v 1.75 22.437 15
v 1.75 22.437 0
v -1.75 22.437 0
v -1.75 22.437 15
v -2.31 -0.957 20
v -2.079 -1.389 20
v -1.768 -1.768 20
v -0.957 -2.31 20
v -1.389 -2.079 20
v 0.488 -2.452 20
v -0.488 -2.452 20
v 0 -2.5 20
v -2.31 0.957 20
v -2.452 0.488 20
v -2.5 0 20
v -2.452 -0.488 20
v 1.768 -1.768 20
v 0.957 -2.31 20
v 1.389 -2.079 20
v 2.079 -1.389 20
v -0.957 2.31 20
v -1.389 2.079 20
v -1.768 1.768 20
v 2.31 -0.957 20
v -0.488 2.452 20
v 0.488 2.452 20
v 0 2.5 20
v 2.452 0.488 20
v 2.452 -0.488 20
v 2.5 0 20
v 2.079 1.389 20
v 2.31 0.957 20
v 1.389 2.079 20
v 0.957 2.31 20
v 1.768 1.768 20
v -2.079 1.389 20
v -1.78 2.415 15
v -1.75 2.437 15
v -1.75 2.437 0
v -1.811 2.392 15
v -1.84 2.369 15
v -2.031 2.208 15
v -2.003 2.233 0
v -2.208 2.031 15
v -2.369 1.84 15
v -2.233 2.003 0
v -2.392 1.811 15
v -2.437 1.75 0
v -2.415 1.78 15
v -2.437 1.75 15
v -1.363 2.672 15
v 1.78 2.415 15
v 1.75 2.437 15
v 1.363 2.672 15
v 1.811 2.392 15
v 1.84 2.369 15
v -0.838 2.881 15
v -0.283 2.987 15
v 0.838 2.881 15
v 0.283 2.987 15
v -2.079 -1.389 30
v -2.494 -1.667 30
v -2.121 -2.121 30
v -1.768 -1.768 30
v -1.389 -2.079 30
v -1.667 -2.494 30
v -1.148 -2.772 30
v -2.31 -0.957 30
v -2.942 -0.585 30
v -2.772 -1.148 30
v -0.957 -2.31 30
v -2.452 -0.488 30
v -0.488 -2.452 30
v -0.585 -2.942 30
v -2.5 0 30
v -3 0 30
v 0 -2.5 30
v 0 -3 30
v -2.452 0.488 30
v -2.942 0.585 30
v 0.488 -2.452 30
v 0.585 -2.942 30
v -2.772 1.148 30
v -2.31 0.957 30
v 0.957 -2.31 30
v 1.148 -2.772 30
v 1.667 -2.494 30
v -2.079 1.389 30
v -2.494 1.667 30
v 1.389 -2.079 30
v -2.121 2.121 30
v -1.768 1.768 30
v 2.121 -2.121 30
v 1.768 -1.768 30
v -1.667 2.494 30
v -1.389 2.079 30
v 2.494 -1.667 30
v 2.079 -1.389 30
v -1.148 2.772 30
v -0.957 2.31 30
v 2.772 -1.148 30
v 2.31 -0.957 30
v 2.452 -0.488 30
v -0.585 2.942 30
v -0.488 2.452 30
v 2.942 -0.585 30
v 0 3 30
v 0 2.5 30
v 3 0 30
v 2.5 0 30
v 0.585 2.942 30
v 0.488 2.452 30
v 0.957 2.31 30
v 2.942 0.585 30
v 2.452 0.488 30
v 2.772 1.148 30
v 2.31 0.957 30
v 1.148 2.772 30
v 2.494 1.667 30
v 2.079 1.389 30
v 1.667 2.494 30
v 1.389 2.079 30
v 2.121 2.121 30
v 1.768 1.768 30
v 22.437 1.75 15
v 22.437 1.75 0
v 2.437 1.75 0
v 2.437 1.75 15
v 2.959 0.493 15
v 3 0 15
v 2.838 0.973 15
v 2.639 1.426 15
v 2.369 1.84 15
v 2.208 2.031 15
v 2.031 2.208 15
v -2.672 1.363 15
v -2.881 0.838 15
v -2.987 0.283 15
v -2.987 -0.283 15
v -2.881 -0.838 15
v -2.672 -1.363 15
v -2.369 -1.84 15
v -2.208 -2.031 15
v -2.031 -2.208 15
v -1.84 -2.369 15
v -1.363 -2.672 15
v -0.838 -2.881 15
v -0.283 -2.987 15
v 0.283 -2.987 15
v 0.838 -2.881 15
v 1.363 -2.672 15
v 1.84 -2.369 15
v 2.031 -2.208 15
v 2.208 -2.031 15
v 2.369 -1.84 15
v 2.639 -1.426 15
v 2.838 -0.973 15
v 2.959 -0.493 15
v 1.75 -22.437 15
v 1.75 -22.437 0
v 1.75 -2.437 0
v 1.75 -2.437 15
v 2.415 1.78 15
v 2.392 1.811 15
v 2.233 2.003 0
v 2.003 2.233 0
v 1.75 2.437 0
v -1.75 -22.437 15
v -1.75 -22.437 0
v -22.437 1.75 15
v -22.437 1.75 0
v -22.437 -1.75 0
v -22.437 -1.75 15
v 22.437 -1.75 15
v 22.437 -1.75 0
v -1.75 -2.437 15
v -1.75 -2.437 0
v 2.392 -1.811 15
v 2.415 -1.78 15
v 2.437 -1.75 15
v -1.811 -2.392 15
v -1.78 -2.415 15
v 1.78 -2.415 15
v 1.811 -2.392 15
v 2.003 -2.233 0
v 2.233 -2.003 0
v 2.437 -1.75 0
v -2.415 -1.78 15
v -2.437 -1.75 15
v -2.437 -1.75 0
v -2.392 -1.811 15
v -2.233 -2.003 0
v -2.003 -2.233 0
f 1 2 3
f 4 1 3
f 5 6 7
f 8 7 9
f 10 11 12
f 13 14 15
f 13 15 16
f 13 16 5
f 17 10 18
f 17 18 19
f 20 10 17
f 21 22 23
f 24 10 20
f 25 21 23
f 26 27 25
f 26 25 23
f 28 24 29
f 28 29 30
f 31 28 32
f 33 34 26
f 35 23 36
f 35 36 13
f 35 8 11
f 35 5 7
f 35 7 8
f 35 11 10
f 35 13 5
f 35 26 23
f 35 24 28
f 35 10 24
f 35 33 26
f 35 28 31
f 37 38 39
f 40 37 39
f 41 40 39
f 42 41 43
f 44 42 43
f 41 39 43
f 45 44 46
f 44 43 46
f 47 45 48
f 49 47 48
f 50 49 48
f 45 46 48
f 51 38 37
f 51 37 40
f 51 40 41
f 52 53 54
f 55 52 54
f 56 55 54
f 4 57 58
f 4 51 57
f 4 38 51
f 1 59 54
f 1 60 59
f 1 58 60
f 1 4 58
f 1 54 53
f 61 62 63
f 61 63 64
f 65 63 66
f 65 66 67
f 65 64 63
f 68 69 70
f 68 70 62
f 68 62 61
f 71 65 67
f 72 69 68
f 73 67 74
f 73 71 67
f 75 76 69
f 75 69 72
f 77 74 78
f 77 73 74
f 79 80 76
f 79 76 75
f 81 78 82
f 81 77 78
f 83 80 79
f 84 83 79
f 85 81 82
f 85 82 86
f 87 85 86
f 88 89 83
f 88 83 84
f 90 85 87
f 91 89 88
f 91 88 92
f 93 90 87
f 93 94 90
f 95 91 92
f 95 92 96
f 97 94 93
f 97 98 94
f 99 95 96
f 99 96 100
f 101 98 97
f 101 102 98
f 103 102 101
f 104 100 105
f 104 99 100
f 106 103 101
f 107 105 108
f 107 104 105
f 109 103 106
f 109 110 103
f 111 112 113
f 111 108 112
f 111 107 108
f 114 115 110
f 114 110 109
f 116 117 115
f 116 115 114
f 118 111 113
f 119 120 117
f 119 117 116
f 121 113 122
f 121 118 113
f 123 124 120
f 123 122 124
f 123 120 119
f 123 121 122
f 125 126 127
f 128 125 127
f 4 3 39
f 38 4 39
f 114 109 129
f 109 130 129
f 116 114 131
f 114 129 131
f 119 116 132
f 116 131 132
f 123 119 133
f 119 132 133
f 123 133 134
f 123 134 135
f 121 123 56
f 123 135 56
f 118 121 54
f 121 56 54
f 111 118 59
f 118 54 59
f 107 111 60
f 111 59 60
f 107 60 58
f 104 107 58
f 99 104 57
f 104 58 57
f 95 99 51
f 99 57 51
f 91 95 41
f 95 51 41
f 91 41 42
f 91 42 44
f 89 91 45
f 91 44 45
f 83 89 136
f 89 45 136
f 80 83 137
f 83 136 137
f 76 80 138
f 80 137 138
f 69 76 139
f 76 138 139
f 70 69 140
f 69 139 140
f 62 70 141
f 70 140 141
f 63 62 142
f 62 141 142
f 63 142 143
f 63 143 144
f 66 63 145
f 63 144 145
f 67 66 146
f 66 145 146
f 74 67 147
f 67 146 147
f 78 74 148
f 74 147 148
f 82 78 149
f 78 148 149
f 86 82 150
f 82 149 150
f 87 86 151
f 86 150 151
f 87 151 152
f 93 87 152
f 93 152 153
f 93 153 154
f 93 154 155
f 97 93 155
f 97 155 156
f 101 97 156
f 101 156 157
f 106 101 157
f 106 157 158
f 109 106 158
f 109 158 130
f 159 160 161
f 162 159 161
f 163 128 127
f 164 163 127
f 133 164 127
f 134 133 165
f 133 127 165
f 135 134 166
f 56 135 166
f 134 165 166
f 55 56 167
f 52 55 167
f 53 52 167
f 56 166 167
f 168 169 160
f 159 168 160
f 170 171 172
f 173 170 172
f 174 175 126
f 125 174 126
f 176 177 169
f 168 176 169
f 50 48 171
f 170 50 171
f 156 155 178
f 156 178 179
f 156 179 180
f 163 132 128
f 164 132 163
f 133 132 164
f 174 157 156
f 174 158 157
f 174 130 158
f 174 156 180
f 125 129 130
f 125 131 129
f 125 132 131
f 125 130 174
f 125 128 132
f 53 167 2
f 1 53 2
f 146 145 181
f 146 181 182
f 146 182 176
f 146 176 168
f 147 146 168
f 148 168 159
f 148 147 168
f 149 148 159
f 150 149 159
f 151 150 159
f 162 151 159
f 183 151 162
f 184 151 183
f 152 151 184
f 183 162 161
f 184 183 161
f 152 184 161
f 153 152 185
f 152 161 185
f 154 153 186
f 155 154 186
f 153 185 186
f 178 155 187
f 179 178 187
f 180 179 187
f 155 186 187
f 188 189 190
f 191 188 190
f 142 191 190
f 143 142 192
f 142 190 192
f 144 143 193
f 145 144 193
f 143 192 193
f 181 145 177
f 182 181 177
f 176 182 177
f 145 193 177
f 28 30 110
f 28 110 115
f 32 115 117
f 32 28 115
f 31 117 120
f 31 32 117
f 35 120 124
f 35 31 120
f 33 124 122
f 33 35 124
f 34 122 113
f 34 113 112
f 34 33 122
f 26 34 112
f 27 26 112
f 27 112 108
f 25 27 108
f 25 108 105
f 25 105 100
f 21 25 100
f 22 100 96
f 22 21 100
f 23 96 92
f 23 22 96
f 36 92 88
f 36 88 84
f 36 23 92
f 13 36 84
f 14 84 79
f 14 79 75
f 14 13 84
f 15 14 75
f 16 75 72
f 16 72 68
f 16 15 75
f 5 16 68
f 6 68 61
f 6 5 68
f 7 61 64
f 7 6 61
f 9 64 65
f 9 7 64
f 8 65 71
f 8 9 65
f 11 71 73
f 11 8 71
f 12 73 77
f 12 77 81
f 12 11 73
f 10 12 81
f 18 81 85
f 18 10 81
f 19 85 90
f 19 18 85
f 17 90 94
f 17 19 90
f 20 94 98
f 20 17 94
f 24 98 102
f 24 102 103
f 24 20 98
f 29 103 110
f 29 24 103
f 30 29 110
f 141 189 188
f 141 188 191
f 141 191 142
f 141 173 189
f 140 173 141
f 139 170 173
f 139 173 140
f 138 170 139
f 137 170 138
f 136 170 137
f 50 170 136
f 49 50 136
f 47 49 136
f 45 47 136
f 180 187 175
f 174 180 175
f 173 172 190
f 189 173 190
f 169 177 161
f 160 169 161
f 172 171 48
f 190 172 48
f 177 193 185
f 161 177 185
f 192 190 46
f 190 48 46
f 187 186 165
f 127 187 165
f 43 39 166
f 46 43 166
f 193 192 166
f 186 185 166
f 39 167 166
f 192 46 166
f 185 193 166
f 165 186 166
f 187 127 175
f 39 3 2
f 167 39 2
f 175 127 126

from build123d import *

# Parameters (mm, degrees)
F1_DEPTH = 15
F2_R     = 3
F3_DEPTH = 5
F4_R     = 3
F4_R_2   = 2.5
F5_DEPTH = 10


with BuildPart() as f1:
    # F0 (on Top) → F1 (new body)
    with BuildSketch(Plane.XY):
        with BuildLine():
            ThreePointArc((2.436699, 1.75), (2.855704, 0.919213), (3, 0))
            ThreePointArc((3, 0), (2.855704, -0.919213), (2.436699, -1.75))
            Line((2.436699, -1.75), (22.436699, -1.75))
            Line((22.436699, -1.75), (22.436699, 1.75))
            Line((22.436699, 1.75), (2.436699, 1.75))
        make_face()
        with BuildLine():
            ThreePointArc((2.436699, -1.75), (2.855704, -0.919213), (3, 0))
            ThreePointArc((3, 0), (2.855704, 0.919213), (2.436699, 1.75))
            ThreePointArc((2.436699, 1.75), (2.12132, 2.12132), (1.75, 2.436699))
            ThreePointArc((1.75, 2.436699), (0, 3), (-1.75, 2.436699))
            ThreePointArc((-1.75, 2.436699), (-2.12132, 2.12132), (-2.436699, 1.75))
            ThreePointArc((-2.436699, 1.75), (-3, 0), (-2.436699, -1.75))
            ThreePointArc((-2.436699, -1.75), (-2.12132, -2.12132), (-1.75, -2.436699))
            ThreePointArc((-1.75, -2.436699), (0, -3), (1.75, -2.436699))
            ThreePointArc((1.75, -2.436699), (2.12132, -2.12132), (2.436699, -1.75))
        make_face()
        with BuildLine():
            Line((1.75, -22.436699), (1.75, -2.436699))
            ThreePointArc((1.75, -2.436699), (0, -3), (-1.75, -2.436699))
            Line((-1.75, -2.436699), (-1.75, -22.436699))
            Line((-1.75, -22.436699), (1.75, -22.436699))
        make_face()
        with BuildLine():
            ThreePointArc((-2.436699, -1.75), (-3, 0), (-2.436699, 1.75))
            Line((-2.436699, 1.75), (-22.436699, 1.75))
            Line((-22.436699, 1.75), (-22.436699, -1.75))
            Line((-22.436699, -1.75), (-2.436699, -1.75))
        make_face()
        with BuildLine():
            ThreePointArc((-1.75, 2.436699), (0, 3), (1.75, 2.436699))
            Line((1.75, 2.436699), (1.75, 22.436699))
            Line((1.75, 22.436699), (-1.75, 22.436699))
            Line((-1.75, 22.436699), (-1.75, 2.436699))
        make_face()
    extrude(amount=F1_DEPTH)

    # F2 (on face) → F3 (join)
    with BuildSketch(Plane.XY.offset(15)):
        Circle(F2_R)
    extrude(amount=F3_DEPTH)

    # F4 (on face) → F5 (join)
    with BuildSketch(Plane.XY.offset(20)):
        Circle(F4_R)
        Circle(F4_R_2, mode=Mode.SUBTRACT)
    extrude(amount=F5_DEPTH)


solid = f1.part
